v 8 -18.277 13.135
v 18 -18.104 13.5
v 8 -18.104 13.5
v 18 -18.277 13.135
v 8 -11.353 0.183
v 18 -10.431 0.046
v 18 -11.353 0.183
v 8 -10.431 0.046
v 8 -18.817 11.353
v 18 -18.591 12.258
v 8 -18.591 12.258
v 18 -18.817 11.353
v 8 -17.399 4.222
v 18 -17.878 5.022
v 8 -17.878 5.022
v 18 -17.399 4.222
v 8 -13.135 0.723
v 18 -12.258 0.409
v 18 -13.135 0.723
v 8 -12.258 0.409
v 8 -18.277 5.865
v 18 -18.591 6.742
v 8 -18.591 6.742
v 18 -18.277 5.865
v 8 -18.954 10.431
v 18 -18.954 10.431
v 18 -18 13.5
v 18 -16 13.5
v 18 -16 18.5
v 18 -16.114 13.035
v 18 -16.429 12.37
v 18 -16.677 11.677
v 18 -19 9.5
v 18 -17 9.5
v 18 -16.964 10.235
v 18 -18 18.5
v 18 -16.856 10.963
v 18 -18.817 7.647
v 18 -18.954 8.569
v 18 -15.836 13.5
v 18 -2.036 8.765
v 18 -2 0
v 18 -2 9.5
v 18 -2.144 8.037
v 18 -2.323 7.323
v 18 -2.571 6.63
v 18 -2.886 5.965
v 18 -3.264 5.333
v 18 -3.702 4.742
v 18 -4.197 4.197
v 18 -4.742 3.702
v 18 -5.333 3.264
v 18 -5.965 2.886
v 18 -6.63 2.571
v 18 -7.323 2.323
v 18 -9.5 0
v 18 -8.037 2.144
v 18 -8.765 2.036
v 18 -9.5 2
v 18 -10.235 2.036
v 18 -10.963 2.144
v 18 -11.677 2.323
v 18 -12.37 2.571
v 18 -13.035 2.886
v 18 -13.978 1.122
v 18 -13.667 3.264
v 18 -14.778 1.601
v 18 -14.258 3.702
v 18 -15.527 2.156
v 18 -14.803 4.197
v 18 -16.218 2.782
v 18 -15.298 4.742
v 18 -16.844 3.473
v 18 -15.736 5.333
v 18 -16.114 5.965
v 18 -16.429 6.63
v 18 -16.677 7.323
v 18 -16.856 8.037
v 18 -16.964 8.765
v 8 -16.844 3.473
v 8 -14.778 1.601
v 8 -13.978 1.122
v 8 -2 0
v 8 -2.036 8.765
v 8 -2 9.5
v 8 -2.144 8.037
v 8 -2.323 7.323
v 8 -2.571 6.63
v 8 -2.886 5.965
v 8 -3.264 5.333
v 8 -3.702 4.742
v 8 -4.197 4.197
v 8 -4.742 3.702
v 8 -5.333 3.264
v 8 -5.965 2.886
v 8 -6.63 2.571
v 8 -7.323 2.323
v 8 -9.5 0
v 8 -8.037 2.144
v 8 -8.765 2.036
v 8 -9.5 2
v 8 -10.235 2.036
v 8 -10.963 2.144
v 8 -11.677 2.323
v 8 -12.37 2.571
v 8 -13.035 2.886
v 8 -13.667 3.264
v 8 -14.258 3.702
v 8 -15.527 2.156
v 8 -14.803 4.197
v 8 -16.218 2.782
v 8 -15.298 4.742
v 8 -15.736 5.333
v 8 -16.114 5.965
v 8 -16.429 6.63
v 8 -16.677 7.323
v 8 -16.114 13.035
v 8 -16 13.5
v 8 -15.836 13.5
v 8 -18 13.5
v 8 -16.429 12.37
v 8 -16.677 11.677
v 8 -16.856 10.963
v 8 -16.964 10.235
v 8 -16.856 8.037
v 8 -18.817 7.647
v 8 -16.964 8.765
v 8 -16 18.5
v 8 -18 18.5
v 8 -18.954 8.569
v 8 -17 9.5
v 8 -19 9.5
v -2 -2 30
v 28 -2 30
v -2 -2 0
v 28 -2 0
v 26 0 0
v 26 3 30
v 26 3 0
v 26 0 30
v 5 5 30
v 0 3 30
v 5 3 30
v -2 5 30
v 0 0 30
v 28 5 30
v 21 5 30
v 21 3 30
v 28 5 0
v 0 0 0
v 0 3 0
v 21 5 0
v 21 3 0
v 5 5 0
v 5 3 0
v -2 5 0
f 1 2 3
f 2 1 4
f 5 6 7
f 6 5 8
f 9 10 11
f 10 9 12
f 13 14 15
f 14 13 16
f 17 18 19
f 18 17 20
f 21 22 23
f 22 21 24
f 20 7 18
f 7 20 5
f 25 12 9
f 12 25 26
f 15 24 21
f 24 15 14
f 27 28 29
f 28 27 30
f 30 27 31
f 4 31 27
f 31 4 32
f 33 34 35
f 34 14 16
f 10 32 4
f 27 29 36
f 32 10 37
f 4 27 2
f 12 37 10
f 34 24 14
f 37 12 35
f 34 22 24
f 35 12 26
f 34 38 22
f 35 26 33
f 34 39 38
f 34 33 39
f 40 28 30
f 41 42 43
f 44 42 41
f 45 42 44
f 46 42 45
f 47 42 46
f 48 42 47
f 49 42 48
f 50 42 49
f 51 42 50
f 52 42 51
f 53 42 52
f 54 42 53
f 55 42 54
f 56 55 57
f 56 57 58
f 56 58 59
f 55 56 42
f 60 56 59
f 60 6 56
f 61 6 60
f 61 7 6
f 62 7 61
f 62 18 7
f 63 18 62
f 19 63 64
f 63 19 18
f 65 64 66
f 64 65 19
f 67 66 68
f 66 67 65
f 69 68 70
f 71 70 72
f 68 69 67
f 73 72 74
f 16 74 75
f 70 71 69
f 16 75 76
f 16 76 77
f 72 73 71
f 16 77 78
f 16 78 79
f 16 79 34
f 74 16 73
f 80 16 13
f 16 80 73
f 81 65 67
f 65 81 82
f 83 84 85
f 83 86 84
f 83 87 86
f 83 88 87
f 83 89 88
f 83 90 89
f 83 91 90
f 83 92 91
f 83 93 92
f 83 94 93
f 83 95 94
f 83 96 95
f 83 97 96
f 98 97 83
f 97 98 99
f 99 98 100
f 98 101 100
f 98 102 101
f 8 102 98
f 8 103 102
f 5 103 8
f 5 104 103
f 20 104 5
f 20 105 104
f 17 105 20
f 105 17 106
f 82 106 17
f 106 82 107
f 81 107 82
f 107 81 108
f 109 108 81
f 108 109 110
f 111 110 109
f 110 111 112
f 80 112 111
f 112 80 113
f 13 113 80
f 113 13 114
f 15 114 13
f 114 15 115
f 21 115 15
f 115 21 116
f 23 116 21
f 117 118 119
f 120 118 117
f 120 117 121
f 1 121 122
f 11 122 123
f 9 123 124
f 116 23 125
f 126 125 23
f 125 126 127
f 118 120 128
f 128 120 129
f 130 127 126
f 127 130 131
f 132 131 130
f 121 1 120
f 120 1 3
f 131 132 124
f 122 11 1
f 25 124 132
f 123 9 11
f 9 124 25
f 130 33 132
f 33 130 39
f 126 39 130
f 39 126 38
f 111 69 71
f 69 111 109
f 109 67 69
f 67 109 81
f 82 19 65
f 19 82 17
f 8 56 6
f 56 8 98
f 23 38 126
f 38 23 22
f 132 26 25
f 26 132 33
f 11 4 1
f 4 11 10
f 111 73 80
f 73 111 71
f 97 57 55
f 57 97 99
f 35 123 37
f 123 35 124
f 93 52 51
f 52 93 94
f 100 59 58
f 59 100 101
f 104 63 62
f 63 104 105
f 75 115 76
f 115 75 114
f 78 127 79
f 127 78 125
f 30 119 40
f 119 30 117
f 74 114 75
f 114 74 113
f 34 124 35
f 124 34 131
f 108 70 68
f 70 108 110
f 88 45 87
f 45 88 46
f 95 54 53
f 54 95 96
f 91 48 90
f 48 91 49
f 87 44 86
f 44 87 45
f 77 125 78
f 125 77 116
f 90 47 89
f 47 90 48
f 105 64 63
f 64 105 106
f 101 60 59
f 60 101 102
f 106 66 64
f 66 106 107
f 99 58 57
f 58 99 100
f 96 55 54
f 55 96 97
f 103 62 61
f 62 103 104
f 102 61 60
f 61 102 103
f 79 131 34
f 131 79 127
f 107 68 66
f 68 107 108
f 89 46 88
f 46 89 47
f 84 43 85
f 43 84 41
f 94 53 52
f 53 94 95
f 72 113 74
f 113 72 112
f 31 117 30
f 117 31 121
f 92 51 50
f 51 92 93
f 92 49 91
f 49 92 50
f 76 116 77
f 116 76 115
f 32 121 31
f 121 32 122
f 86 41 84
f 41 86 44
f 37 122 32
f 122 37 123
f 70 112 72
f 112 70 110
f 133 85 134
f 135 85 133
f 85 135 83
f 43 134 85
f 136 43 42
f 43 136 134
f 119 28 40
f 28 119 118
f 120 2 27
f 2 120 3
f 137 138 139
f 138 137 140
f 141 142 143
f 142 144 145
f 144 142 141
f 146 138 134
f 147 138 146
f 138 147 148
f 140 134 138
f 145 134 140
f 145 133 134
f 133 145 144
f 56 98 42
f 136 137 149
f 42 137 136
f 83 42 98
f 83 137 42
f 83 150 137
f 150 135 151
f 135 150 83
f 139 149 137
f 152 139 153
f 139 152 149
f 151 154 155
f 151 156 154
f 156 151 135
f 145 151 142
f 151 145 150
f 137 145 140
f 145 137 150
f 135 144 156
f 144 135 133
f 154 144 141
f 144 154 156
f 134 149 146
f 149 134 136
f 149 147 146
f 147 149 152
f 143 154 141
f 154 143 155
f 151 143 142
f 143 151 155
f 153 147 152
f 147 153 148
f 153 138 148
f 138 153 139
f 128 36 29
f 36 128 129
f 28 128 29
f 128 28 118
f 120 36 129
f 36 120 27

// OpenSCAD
// Definition size of housing
// **************************

width      = 26;    
height      = 30;     
space     = 3;
wall        = 2;
grip = 5;

dia     = 15;            
clipwid     = 10;
clipextra =4; //this is the height of the extra curve on the clip
clipgrip =5; //this is the extra straight bit on the clip

//Definition of circle angular resolution
resol        = 64;           // Identical to housing !!!



    translate ([0,-wall,0]) cube([width,wall,height]); //back
    translate ([-wall,-wall,0]) cube([wall,space+wall*2,height]); //side
    translate ([width,-wall,0]) cube([wall,space+wall*2,height]); //side
    translate ([0,space,0]) cube([grip,wall,height]); //curtain hold 1
    translate ([width-grip,space,0]) cube([grip,wall,height]); //curtain hold 2
    
    translate ([width/2-clipwid/2,-dia/2-wall,0]) cube([clipwid,dia/2,wall]); //clip flat top



difference () {
    translate ([width/2-clipwid/2,-dia/2-wall,dia/2+wall]) rotate ([0,90,0]) cylinder ( h=clipwid, r=wall+dia/2, center=false, $fn = resol);

    translate ([width/2-clipwid/2-1,-dia/2-wall,dia/2+wall]) rotate ([0,90,0]) cylinder ( h=clipwid+2, r=dia/2, center=false, $fn = resol);

    translate ([width/2-clipwid/2-1,-dia/2-wall,dia/2+wall]) cube([clipwid+2,dia/2,wall*2+dia]); //remove inside part

    translate ([width/2-clipwid/2-1,-dia-wall*2,wall+dia/2+clipextra]) cube([clipwid+2,dia/2+wall,wall*2+dia]); //remove outside part

}

    translate ([width/2-clipwid/2,-dia-wall*2+1,dia/2+wall+clipextra]) cube([clipwid,wall,clipgrip]); //clip straight grip section

    translate ([width/2-clipwid/2,-wall*2,0]) cube([clipwid,wall,wall*2]); //infill back of clip
